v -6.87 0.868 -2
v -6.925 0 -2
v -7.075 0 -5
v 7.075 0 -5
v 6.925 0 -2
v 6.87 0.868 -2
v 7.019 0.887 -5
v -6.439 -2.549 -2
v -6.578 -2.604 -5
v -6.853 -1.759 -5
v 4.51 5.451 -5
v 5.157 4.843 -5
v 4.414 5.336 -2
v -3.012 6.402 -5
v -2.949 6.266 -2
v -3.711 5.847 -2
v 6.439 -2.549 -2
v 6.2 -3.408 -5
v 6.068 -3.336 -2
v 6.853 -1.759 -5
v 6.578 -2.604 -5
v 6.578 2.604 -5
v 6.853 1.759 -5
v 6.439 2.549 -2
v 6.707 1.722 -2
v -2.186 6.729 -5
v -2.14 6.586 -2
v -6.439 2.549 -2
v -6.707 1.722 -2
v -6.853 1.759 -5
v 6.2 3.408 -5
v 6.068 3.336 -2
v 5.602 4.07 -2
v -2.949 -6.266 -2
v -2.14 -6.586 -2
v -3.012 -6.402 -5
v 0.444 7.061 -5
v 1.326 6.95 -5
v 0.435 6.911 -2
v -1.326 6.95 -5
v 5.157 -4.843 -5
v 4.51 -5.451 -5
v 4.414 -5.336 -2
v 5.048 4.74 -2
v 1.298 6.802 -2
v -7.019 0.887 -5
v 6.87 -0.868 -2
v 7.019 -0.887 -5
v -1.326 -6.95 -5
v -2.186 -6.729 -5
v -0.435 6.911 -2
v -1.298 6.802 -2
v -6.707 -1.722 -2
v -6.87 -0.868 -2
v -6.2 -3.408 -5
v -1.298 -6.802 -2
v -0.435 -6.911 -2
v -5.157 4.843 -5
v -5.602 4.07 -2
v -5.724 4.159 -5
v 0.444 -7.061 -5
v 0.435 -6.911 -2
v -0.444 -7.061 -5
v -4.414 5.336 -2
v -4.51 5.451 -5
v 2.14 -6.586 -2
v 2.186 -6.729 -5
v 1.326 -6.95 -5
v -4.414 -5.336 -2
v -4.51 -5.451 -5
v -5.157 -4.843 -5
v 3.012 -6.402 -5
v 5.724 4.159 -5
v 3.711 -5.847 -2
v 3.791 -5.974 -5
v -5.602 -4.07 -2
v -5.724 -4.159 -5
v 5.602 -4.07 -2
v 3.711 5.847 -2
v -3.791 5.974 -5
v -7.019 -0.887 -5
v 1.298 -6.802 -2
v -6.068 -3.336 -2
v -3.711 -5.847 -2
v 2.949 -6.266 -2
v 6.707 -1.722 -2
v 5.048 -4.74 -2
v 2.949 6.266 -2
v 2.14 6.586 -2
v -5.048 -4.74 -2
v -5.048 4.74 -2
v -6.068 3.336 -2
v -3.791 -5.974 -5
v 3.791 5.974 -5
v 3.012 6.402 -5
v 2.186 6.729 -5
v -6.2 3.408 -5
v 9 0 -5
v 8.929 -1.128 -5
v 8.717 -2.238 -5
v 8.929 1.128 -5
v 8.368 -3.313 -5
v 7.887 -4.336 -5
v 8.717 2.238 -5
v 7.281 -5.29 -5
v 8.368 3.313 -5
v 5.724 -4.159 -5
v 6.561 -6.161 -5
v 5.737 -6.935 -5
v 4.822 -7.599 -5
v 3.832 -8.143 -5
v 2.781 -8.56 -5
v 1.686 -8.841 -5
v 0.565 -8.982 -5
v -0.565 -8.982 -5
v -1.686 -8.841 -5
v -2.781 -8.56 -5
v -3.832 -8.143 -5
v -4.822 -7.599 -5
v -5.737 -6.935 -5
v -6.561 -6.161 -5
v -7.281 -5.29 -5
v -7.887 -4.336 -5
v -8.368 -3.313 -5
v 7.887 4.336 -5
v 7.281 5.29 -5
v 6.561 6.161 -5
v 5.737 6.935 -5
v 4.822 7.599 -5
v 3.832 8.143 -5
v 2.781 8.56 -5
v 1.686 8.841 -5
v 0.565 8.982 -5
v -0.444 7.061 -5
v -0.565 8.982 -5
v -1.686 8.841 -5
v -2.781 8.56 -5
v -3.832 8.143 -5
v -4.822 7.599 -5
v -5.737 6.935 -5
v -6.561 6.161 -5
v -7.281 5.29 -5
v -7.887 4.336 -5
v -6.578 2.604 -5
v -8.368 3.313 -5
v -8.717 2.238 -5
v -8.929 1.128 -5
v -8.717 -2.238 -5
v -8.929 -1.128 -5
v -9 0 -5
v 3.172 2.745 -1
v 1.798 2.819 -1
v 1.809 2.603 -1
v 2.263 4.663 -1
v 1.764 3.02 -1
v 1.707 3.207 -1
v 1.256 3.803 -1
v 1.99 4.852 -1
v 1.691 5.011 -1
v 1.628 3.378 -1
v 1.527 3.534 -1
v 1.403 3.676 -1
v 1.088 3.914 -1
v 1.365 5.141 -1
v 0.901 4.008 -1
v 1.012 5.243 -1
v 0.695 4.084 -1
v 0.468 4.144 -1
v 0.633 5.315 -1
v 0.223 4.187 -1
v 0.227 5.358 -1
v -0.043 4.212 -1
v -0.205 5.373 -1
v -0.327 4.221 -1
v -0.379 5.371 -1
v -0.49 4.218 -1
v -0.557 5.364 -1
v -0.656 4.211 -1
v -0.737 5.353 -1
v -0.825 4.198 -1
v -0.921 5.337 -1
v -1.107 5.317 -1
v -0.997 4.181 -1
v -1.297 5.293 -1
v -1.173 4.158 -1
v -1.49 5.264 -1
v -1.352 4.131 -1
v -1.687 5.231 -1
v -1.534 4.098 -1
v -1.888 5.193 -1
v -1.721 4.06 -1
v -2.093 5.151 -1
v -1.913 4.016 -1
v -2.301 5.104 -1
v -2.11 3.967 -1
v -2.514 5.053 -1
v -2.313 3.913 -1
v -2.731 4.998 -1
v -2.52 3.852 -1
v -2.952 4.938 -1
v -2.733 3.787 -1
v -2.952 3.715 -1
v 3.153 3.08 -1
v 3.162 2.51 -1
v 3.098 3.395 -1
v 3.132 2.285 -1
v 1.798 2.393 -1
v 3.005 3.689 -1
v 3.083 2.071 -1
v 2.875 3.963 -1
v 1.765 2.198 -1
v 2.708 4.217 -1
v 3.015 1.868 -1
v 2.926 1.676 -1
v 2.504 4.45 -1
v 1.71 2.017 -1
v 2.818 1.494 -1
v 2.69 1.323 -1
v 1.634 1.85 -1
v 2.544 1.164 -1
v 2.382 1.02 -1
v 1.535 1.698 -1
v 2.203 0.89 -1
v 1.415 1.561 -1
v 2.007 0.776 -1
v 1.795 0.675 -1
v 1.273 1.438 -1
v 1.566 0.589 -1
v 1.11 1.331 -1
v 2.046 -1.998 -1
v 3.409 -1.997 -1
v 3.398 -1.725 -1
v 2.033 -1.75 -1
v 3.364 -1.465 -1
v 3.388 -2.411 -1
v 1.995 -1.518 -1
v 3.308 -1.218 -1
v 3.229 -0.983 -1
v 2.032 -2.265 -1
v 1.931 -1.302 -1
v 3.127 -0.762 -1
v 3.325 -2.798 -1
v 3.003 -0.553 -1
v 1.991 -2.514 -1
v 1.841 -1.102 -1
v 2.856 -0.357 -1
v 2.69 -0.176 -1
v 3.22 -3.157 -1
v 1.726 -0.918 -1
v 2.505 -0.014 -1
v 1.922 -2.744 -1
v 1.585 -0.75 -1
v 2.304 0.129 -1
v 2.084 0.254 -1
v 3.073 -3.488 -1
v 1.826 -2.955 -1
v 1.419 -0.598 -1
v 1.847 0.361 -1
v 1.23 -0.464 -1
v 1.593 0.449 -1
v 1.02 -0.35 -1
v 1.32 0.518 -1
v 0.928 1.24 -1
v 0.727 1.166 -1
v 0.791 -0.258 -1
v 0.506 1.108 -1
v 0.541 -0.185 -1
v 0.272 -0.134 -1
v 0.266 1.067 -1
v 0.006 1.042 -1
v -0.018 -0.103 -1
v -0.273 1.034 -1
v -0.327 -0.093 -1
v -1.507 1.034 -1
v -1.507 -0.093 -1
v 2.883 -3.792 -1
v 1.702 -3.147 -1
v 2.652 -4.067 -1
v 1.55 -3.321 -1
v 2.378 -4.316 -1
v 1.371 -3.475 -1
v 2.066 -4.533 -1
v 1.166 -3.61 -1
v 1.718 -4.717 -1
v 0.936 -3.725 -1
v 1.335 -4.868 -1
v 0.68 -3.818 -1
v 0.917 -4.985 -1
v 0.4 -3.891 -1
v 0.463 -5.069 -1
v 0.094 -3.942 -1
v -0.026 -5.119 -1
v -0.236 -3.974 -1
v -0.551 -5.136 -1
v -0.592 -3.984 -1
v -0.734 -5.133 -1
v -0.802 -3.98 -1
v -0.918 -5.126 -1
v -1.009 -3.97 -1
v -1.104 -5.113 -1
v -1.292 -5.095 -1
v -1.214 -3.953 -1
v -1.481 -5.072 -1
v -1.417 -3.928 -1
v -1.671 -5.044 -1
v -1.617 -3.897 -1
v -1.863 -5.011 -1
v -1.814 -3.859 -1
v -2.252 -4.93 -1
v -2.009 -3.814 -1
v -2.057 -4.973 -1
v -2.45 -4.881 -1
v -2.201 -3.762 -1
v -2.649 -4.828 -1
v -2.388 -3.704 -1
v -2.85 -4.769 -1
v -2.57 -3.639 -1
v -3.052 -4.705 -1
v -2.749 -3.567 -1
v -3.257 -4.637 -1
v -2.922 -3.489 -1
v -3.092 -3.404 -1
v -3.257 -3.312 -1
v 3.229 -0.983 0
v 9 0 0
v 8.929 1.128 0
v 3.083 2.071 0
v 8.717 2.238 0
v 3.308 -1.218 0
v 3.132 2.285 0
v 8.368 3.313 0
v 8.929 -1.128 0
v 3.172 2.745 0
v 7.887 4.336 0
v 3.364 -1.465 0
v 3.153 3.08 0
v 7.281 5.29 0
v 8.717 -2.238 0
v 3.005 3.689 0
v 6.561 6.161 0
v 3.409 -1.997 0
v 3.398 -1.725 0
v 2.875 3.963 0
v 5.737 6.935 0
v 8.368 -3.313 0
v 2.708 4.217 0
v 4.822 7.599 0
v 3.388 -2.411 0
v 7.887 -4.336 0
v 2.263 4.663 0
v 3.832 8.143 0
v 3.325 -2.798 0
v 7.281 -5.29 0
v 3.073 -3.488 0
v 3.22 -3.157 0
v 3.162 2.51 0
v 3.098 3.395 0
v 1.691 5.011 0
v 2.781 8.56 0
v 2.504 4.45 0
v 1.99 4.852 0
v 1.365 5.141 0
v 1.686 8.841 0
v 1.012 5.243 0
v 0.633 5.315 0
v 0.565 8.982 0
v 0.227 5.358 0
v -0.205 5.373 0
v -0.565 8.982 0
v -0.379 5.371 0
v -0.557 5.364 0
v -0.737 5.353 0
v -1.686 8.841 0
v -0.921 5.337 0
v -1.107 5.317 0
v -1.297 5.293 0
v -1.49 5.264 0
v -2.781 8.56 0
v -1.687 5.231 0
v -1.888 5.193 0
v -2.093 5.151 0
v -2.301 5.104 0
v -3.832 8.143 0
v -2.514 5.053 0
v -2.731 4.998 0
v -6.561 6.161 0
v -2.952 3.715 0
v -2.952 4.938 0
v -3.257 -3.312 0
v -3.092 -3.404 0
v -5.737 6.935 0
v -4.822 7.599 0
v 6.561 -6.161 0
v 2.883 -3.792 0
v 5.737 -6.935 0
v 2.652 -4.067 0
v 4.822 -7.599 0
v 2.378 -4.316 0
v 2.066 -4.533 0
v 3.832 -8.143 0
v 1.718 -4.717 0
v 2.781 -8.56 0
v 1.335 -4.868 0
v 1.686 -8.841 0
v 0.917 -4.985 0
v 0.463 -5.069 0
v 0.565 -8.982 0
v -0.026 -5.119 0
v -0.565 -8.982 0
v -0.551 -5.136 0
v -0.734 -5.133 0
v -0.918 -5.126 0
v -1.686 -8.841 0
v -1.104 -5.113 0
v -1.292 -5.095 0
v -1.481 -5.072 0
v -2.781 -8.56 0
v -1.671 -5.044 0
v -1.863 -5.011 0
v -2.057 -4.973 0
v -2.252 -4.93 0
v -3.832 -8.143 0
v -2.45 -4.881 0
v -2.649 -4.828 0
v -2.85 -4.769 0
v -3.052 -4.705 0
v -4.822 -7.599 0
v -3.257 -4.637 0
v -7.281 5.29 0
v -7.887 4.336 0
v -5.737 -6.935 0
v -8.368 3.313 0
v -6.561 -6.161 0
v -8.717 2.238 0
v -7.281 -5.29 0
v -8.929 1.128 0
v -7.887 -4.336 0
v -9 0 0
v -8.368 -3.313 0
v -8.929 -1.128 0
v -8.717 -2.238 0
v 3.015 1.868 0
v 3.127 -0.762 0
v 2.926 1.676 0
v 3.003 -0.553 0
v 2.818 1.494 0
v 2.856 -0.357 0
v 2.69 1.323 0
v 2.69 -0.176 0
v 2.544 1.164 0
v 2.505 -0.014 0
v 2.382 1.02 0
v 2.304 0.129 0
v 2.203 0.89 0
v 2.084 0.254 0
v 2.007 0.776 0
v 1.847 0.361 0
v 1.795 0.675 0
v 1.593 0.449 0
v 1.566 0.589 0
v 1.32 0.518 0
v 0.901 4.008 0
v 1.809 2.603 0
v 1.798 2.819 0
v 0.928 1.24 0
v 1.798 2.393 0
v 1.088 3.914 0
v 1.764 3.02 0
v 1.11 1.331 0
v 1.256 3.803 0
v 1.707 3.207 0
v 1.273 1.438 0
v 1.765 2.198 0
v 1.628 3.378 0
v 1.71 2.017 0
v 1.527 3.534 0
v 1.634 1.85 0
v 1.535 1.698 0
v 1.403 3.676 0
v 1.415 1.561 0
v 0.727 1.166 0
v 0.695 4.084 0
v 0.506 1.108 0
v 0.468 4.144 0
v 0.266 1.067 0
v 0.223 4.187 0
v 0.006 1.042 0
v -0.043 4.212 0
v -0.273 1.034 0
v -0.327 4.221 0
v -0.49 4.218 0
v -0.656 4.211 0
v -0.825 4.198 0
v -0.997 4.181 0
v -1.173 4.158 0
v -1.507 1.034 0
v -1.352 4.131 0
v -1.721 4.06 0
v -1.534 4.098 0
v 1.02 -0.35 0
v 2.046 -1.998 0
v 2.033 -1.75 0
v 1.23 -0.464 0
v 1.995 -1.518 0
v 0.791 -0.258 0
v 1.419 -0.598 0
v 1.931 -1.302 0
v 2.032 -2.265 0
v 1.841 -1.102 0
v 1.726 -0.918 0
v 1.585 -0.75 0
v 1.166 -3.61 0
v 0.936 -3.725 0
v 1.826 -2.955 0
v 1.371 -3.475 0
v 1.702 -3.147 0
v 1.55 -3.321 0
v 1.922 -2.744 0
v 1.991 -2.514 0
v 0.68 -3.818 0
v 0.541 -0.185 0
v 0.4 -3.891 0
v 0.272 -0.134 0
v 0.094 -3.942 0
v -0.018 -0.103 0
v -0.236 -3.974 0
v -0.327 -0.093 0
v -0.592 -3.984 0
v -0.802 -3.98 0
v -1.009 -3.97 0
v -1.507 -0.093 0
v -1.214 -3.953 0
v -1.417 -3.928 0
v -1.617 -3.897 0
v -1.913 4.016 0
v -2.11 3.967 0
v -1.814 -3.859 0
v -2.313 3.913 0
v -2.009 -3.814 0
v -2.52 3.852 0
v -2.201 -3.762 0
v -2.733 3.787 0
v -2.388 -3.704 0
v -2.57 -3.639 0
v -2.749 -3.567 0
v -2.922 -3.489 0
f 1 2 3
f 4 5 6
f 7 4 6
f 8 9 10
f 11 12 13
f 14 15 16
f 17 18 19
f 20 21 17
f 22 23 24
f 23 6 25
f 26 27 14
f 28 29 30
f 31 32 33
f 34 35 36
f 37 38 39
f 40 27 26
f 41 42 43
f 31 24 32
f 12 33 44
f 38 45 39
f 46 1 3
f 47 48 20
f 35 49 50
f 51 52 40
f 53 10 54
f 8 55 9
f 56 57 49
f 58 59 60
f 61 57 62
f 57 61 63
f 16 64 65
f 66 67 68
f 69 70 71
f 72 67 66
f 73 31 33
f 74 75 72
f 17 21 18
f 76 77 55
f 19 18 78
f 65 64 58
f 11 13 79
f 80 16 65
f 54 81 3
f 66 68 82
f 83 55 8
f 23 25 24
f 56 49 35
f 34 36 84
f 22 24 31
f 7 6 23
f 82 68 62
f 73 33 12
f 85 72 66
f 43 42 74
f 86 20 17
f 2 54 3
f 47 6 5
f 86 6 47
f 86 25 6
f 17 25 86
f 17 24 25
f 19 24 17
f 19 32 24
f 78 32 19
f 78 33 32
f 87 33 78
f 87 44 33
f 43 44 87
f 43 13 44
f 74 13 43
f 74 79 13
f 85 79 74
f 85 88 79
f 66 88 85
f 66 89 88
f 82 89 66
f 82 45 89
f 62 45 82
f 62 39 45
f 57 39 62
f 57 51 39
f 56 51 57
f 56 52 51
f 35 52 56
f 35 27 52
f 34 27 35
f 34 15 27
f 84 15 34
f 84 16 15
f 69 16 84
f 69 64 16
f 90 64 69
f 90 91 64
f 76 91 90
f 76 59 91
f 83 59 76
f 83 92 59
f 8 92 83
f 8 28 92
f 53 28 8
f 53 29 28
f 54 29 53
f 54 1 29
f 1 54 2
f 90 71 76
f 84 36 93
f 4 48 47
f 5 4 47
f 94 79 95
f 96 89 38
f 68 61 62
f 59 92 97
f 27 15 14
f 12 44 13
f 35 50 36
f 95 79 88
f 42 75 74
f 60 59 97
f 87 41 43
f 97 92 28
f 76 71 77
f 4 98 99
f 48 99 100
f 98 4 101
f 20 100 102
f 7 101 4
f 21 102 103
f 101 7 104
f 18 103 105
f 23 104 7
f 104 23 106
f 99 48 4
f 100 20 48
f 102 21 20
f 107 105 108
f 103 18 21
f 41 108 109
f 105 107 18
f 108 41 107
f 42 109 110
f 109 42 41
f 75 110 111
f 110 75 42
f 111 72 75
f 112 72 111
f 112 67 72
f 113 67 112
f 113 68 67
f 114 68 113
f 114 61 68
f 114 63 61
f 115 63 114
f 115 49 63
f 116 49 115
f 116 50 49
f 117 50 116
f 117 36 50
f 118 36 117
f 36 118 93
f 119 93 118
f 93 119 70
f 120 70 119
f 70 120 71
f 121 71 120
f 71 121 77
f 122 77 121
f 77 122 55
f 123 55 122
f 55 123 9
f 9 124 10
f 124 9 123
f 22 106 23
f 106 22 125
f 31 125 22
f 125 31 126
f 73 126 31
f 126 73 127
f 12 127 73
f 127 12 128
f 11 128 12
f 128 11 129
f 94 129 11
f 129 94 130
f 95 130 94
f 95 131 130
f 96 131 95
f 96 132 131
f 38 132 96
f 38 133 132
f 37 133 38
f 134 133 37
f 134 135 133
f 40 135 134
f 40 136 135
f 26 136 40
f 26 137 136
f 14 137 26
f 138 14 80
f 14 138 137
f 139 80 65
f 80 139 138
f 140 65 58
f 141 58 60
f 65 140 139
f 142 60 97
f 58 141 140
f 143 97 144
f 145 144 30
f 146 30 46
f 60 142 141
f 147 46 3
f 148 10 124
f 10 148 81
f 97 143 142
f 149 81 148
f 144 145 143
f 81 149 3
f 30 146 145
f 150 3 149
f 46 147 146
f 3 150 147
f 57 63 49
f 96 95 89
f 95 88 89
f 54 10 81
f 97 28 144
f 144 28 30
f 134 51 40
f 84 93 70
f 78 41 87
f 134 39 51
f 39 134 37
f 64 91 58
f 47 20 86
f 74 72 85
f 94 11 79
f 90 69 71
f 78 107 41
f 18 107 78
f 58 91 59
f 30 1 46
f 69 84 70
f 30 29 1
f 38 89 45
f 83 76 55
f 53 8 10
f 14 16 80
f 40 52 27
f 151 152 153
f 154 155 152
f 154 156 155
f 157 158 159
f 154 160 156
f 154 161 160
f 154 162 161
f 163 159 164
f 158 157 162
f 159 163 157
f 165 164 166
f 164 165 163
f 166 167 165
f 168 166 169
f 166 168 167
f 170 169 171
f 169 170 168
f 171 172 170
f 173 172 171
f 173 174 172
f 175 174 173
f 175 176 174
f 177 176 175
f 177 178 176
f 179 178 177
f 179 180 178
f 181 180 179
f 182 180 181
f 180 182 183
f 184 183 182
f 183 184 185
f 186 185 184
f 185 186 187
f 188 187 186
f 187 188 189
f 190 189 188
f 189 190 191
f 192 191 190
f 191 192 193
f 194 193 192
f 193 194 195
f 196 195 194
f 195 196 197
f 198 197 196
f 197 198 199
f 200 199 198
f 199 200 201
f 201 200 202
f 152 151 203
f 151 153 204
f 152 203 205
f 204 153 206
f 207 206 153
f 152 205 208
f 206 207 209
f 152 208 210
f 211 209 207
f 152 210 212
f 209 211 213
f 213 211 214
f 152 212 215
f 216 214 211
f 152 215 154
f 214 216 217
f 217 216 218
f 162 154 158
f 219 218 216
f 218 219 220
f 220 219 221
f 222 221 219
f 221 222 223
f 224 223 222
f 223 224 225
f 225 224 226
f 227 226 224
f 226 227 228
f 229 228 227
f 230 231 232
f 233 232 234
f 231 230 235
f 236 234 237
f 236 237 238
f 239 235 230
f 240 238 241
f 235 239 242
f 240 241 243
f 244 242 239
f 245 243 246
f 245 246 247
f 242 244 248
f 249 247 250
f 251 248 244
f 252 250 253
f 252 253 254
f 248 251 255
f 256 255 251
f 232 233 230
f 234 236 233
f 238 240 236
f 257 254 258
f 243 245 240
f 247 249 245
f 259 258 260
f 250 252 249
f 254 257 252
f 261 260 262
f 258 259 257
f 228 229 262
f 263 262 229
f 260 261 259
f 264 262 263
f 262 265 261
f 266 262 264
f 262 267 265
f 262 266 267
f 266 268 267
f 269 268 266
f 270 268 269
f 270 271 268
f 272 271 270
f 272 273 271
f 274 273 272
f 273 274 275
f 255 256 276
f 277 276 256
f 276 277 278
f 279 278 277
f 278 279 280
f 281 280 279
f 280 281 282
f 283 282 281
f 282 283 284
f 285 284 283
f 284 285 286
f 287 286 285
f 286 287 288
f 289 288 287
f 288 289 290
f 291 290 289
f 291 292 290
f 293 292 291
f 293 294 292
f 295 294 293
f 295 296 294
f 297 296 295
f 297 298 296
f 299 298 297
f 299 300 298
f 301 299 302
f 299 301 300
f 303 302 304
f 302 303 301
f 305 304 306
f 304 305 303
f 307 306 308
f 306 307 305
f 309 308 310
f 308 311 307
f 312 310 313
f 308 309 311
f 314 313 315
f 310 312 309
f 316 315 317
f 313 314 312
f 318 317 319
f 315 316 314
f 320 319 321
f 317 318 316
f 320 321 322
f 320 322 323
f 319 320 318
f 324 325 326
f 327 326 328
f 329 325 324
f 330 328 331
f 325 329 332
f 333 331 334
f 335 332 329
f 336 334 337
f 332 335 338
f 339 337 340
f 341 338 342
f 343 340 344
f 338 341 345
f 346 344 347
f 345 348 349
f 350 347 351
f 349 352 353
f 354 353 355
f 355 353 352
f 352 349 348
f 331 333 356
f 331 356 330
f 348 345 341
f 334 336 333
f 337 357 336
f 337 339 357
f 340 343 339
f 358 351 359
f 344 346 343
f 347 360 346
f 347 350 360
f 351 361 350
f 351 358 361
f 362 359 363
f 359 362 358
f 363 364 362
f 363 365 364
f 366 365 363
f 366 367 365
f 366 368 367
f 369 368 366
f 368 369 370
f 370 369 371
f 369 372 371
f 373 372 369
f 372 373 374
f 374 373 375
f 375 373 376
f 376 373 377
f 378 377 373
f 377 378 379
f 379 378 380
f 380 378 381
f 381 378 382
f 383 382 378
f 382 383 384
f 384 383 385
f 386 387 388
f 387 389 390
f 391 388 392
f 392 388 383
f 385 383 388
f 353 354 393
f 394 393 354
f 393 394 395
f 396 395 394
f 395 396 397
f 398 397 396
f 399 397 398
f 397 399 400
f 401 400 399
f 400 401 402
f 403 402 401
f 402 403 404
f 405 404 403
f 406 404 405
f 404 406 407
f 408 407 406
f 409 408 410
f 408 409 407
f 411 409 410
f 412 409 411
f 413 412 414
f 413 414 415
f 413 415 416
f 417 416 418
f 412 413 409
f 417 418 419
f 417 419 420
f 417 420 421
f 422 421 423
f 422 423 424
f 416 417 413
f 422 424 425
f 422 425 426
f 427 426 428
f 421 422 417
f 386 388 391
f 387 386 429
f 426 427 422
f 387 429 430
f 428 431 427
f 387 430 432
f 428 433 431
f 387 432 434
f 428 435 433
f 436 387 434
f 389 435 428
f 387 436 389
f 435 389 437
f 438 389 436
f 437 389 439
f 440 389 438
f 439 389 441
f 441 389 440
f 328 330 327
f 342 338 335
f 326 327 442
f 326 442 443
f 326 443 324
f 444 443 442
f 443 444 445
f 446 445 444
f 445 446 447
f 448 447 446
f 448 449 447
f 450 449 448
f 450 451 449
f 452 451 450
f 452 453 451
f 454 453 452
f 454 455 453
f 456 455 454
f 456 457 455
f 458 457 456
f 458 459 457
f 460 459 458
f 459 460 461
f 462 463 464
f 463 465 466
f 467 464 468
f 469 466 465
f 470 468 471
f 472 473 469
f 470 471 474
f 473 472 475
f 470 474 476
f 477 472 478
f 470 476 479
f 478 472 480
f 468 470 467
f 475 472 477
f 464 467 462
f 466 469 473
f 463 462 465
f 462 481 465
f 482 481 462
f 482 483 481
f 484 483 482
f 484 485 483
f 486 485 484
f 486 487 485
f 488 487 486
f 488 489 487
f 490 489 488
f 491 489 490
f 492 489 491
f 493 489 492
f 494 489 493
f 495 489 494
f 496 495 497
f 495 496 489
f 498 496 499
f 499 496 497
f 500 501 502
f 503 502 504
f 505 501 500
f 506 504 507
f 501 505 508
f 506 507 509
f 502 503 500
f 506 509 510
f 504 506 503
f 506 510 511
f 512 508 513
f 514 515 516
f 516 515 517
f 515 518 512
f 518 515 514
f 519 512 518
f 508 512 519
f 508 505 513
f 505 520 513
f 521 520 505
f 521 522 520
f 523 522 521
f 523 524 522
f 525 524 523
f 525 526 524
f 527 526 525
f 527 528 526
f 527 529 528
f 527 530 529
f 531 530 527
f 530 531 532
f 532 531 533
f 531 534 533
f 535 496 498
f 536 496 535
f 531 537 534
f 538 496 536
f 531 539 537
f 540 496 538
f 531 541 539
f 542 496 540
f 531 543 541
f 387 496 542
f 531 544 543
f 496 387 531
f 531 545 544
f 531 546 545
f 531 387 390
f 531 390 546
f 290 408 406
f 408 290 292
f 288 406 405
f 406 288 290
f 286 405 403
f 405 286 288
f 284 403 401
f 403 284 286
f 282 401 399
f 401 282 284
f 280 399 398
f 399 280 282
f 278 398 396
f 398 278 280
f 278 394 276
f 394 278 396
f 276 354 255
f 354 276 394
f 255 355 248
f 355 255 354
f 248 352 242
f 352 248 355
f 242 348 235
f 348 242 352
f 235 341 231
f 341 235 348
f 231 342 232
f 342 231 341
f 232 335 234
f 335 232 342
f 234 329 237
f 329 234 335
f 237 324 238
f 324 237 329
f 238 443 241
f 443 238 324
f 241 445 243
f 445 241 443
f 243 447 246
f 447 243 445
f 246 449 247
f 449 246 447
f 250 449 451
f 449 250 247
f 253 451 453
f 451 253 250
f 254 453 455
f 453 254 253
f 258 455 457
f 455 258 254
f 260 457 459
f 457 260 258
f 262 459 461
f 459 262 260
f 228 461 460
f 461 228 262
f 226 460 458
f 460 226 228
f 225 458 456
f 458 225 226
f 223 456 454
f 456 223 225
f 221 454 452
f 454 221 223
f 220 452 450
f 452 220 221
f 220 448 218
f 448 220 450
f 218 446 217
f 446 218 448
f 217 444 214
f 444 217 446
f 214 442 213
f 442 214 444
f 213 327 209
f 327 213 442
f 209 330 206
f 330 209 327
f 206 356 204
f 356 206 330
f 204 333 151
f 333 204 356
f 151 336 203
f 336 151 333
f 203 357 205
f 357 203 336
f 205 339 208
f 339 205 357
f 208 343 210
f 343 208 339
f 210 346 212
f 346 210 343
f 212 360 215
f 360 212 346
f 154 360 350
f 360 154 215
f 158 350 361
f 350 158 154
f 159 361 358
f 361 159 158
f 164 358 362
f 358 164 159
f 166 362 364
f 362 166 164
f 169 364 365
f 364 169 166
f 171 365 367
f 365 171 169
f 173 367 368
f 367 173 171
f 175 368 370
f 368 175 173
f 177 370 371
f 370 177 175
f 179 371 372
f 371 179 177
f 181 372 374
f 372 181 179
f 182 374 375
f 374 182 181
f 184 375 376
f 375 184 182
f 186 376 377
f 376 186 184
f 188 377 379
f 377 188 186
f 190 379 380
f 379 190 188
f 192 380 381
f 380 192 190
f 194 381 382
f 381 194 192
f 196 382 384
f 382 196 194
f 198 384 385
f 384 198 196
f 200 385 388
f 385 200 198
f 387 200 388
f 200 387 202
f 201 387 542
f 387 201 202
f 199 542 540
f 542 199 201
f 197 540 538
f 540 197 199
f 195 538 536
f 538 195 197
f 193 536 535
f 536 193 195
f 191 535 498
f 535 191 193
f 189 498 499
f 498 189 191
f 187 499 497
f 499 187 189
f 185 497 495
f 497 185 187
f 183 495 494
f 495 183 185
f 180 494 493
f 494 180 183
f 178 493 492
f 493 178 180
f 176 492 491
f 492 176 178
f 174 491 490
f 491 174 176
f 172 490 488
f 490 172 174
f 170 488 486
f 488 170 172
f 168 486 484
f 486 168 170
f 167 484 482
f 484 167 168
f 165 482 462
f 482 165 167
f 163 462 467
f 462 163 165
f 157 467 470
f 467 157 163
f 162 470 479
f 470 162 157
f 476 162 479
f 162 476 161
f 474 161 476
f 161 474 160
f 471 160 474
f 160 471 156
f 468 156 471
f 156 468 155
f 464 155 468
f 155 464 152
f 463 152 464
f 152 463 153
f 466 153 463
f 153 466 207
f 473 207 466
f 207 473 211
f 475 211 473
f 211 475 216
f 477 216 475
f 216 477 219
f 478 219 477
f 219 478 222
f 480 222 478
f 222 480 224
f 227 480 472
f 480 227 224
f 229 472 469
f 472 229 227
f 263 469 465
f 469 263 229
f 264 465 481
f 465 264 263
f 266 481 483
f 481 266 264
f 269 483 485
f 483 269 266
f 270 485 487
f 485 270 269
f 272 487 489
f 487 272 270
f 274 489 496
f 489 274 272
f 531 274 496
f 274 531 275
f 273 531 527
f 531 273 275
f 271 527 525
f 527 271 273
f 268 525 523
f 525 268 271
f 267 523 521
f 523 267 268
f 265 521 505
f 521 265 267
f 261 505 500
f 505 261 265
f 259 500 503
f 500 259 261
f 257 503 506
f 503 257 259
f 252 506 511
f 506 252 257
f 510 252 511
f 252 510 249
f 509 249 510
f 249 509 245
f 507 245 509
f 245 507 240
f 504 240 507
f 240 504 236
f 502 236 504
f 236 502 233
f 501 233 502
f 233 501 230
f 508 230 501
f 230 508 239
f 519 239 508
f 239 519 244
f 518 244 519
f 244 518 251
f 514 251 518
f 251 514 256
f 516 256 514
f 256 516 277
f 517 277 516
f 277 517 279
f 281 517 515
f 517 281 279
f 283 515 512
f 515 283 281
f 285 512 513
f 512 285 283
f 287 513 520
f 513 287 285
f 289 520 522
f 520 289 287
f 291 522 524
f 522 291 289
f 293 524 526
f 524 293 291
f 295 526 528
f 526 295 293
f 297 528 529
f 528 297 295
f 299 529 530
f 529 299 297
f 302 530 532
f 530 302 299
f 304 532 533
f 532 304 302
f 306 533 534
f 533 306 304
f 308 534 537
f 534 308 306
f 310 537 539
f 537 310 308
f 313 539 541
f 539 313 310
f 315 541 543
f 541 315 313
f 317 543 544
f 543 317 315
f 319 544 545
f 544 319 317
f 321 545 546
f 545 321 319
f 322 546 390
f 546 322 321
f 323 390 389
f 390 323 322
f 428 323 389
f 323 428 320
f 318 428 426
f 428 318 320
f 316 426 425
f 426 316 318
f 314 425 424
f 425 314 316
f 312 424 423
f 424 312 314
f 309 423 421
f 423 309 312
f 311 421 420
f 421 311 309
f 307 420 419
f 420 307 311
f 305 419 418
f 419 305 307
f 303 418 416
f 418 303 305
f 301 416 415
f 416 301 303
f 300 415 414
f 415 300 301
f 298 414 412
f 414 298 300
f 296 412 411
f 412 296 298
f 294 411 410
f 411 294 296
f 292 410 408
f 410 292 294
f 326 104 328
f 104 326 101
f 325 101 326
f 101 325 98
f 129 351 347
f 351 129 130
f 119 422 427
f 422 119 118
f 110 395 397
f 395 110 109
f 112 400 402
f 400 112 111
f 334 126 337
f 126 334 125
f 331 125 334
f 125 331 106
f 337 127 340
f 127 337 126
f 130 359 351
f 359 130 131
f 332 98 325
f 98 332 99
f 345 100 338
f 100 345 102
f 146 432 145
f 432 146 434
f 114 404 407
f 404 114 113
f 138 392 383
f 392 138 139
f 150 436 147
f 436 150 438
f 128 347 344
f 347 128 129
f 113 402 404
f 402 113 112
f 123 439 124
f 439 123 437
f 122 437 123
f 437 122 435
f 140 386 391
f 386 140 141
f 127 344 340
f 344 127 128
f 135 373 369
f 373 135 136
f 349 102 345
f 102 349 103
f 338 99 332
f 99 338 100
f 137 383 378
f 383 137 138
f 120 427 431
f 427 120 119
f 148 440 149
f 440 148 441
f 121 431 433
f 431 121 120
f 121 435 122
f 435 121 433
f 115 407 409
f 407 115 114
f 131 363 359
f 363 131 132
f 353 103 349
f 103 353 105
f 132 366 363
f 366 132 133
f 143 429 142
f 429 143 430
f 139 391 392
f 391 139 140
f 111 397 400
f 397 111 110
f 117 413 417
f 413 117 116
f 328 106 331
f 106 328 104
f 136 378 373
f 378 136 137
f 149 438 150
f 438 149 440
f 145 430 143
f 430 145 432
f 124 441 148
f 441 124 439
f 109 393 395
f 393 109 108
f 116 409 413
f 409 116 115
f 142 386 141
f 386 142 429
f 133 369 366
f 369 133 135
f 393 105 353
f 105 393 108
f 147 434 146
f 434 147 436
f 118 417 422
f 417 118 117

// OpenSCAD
$fn = 50;

difference() {
	union() {
		translate(v = [0, 0, -5.0]) {
			cylinder(h = 5, r = 9.0);
		}
	}
	union() {
		#translate(v = [0, 0, -5.0]) {
			cylinder(h = 3, r1 = 7.075, r2 = 6.925);
		}
		translate(v = [0, 0, -1]) {
			linear_extrude(height = 1) {
				text(font = "Impact", halign = "center", size = 10, text = "3", valign = "center");
			}
		}
	}
}
